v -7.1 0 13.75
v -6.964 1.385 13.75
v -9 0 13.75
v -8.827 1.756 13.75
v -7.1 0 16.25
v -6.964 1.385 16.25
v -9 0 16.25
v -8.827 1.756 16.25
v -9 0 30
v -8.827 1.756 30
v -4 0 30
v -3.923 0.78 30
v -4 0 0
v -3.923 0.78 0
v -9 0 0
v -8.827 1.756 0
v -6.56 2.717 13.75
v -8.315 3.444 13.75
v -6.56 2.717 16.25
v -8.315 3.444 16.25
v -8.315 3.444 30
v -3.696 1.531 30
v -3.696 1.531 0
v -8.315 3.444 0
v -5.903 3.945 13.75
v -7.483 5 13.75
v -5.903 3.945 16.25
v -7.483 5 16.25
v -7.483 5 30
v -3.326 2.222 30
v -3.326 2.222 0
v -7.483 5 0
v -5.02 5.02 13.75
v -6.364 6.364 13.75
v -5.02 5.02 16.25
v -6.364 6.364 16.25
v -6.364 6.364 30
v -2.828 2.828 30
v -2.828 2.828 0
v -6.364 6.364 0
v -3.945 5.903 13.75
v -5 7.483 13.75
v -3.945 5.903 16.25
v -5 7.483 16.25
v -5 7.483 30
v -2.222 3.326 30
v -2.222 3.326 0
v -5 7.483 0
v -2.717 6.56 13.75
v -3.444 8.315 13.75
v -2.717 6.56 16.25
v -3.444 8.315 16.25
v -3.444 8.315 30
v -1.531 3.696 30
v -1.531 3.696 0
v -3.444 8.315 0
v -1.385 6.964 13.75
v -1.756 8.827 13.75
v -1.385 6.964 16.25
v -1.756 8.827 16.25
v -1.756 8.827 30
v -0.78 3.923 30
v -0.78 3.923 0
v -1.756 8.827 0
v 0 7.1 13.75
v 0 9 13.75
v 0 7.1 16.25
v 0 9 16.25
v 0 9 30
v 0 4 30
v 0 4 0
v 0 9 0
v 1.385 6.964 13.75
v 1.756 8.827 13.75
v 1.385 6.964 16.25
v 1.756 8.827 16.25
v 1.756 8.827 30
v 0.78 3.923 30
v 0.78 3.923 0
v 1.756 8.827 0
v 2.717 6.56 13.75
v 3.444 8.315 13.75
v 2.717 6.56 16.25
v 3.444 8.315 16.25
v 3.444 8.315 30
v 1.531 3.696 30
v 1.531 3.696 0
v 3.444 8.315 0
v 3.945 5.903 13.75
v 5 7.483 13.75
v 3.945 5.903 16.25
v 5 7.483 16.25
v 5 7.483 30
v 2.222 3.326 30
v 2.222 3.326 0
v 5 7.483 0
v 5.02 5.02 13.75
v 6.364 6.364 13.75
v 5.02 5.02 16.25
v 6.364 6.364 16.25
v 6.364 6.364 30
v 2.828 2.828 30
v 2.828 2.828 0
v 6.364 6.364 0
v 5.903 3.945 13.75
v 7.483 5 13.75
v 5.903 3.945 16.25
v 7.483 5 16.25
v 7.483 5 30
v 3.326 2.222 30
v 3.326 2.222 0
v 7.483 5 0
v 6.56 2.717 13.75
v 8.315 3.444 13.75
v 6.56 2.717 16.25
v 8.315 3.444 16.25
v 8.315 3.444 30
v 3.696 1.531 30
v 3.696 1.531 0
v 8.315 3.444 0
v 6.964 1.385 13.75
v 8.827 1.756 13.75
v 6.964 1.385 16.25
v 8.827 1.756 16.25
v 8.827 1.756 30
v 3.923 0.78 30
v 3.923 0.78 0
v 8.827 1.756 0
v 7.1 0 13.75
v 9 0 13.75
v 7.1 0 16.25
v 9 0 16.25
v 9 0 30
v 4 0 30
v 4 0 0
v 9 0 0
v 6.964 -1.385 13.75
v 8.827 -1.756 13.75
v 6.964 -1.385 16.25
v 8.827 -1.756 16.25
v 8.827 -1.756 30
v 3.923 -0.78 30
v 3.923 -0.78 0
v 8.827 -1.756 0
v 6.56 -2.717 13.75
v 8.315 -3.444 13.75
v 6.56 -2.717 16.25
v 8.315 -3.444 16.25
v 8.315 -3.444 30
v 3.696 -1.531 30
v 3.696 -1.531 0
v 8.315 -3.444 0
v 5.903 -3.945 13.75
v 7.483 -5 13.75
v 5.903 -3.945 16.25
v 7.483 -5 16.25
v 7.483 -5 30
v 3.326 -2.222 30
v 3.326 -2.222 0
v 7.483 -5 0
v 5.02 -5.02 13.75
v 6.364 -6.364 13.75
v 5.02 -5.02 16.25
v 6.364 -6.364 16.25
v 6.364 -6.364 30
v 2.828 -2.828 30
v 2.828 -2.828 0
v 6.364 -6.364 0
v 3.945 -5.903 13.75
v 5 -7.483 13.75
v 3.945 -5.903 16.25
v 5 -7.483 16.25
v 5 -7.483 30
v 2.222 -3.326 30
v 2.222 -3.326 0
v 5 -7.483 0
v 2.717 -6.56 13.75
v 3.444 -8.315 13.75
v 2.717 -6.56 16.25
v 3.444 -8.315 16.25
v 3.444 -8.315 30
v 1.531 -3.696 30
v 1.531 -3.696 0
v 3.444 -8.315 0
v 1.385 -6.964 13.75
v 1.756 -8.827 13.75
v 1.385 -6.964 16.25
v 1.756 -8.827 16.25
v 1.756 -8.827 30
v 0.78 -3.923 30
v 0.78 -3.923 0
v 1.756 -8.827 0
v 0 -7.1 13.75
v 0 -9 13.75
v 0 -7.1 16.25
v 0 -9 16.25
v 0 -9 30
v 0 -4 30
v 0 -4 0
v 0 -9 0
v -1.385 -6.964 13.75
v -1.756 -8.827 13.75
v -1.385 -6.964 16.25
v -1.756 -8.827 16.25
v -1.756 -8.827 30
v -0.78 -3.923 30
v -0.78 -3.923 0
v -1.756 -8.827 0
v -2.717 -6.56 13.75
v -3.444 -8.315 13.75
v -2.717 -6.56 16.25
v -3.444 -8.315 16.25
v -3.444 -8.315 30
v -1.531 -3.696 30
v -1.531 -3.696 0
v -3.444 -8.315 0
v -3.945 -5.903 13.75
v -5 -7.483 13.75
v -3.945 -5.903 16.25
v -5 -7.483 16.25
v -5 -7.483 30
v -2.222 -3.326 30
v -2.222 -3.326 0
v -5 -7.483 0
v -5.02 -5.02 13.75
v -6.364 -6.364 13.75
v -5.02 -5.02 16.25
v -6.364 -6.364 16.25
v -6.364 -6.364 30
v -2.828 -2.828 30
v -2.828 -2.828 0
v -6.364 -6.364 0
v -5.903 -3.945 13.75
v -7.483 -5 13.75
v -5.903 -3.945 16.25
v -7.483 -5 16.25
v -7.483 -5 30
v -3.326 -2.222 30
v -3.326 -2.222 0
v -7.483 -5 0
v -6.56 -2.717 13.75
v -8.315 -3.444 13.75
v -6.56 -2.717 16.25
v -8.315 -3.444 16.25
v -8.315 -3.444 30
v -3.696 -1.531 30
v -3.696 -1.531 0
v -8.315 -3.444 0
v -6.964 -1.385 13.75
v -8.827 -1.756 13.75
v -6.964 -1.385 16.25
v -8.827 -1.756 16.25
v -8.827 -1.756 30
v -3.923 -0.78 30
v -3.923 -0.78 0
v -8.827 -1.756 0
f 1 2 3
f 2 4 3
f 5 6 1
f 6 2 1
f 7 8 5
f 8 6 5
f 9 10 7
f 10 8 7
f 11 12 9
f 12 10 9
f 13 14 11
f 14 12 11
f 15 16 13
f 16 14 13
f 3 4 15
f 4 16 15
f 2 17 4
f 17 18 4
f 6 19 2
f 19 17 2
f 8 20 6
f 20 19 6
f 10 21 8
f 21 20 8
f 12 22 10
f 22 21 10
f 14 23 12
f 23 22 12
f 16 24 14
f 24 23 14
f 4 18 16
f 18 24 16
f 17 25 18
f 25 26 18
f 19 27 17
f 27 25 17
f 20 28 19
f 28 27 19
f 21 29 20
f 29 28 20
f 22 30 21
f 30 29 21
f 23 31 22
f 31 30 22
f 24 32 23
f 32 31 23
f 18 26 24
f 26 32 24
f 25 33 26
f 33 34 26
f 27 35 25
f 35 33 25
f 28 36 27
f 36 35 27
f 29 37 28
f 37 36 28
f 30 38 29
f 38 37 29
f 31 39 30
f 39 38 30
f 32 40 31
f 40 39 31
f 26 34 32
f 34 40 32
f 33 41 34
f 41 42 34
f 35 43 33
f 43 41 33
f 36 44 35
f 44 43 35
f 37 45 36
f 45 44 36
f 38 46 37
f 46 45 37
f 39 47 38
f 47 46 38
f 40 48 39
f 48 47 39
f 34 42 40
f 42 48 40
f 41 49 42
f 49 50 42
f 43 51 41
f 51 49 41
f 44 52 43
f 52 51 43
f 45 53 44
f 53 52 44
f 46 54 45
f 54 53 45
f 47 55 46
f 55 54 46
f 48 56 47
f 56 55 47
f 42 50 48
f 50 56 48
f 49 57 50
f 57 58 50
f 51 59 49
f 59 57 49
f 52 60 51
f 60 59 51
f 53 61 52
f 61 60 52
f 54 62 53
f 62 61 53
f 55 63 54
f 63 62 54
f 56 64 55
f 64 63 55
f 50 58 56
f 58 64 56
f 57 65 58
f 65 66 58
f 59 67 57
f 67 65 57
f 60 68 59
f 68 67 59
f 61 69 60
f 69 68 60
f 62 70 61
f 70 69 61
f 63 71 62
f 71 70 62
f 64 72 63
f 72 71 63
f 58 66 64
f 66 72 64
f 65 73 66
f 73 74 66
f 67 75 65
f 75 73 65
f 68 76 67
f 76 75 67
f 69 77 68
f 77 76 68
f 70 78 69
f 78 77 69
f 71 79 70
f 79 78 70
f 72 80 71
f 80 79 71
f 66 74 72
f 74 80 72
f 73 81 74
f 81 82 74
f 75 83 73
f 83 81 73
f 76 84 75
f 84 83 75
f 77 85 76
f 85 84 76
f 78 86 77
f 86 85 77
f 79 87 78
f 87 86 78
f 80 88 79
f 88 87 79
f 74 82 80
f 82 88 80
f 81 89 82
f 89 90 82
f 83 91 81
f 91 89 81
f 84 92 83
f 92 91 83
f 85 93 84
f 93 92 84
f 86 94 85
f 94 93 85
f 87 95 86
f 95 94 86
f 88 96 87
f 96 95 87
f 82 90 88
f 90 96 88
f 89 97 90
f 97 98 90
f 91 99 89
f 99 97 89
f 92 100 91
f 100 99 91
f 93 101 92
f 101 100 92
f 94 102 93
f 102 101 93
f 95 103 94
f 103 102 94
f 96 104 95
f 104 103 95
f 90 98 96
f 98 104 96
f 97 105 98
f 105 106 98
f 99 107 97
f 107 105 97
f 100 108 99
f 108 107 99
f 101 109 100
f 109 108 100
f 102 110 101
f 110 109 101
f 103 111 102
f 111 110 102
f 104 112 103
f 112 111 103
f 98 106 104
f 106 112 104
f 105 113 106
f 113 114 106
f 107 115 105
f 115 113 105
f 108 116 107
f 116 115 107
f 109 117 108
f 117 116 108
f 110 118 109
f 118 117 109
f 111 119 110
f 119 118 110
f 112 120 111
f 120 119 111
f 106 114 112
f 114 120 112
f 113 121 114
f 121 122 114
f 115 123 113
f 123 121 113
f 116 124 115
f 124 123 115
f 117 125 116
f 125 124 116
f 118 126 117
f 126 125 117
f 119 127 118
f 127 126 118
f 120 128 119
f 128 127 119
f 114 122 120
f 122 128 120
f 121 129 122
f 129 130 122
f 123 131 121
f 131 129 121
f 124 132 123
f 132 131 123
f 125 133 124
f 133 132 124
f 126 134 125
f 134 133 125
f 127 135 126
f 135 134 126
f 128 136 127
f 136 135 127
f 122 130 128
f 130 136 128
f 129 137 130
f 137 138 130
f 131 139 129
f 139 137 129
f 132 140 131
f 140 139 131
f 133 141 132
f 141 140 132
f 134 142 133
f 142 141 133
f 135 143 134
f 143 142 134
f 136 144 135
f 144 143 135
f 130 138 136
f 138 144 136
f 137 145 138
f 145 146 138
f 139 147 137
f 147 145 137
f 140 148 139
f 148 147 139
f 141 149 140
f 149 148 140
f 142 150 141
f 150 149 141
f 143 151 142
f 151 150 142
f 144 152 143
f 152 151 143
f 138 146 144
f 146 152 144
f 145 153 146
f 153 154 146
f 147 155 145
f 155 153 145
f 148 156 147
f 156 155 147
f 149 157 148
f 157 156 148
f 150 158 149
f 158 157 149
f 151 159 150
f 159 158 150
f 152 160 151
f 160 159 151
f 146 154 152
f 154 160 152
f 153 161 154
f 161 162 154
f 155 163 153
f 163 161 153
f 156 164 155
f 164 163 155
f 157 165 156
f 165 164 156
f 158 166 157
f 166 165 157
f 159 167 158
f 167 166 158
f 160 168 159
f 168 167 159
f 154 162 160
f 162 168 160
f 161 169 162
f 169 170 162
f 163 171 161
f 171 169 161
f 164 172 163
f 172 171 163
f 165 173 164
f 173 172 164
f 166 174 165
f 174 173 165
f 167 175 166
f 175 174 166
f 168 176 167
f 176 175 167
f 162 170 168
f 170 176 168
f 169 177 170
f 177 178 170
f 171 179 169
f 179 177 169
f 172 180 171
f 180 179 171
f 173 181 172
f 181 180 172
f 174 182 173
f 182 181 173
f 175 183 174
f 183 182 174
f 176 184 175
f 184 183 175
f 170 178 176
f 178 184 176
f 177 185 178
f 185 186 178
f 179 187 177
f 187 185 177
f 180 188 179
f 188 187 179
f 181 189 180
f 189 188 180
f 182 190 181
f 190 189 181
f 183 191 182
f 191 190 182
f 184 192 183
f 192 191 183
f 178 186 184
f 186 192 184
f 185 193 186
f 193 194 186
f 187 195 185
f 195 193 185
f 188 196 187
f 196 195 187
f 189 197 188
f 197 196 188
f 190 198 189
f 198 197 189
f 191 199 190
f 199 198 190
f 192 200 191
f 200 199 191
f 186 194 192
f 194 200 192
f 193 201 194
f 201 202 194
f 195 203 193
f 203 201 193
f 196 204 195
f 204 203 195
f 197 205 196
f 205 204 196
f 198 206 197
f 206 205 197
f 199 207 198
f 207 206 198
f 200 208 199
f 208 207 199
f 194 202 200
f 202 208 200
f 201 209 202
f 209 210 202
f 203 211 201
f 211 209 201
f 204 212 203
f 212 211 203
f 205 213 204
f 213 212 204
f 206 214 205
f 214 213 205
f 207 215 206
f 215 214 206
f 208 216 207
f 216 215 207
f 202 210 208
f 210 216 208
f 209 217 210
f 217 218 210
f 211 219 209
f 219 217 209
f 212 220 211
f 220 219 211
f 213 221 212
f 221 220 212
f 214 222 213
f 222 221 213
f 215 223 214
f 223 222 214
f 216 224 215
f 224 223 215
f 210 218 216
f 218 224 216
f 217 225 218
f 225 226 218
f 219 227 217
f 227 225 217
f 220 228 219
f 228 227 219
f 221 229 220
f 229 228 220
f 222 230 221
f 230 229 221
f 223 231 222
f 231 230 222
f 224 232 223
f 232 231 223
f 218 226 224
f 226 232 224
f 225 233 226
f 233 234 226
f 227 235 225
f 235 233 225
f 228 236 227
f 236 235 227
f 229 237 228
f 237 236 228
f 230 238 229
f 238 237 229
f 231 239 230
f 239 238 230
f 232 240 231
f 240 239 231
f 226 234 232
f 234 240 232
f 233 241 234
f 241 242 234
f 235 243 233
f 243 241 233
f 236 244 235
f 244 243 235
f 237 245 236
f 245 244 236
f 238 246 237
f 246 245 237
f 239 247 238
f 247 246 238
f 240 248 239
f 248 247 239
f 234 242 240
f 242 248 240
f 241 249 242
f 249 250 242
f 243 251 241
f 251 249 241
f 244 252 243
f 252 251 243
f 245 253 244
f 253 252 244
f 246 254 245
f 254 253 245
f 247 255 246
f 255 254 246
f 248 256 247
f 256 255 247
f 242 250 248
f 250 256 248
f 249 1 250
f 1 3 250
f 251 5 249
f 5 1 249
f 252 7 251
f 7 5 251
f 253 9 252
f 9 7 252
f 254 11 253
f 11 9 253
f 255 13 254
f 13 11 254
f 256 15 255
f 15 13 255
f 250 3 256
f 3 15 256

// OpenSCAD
$fn = 32;

// ----------------------------------------------------------------------
// Grooved revolve: stepped, bore R4
// ----------------------------------------------------------------------

// --- parameters (mm) ---
bore_r = 4;               // bore radius
outer_r = 9;              // outer radius of the body
total_h = 30;             // overall height, Z
wall = 5;                 // radial wall thickness
groove_w = 2.5;           // groove width
groove_d = 1.9;           // groove depth
grooves = 1;              // number of outer grooves

bbox_x = 2 * outer_r;  // full diameter
bore_d = 2 * bore_r;  // bore diameter
body_d = 2 * outer_r;  // body diameter
revolve_angle = 360;  // full turn around the Z axis

profile = [[4, 0], [9, 0], [9, 13.75], [7.1, 13.75], [7.1, 16.25], [9, 16.25], [9, 30], [4, 30]];  // primary outline, 8 points, counter clockwise

// --- the one profile operation ---
rotate_extrude(angle = revolve_angle) polygon(points = profile);
